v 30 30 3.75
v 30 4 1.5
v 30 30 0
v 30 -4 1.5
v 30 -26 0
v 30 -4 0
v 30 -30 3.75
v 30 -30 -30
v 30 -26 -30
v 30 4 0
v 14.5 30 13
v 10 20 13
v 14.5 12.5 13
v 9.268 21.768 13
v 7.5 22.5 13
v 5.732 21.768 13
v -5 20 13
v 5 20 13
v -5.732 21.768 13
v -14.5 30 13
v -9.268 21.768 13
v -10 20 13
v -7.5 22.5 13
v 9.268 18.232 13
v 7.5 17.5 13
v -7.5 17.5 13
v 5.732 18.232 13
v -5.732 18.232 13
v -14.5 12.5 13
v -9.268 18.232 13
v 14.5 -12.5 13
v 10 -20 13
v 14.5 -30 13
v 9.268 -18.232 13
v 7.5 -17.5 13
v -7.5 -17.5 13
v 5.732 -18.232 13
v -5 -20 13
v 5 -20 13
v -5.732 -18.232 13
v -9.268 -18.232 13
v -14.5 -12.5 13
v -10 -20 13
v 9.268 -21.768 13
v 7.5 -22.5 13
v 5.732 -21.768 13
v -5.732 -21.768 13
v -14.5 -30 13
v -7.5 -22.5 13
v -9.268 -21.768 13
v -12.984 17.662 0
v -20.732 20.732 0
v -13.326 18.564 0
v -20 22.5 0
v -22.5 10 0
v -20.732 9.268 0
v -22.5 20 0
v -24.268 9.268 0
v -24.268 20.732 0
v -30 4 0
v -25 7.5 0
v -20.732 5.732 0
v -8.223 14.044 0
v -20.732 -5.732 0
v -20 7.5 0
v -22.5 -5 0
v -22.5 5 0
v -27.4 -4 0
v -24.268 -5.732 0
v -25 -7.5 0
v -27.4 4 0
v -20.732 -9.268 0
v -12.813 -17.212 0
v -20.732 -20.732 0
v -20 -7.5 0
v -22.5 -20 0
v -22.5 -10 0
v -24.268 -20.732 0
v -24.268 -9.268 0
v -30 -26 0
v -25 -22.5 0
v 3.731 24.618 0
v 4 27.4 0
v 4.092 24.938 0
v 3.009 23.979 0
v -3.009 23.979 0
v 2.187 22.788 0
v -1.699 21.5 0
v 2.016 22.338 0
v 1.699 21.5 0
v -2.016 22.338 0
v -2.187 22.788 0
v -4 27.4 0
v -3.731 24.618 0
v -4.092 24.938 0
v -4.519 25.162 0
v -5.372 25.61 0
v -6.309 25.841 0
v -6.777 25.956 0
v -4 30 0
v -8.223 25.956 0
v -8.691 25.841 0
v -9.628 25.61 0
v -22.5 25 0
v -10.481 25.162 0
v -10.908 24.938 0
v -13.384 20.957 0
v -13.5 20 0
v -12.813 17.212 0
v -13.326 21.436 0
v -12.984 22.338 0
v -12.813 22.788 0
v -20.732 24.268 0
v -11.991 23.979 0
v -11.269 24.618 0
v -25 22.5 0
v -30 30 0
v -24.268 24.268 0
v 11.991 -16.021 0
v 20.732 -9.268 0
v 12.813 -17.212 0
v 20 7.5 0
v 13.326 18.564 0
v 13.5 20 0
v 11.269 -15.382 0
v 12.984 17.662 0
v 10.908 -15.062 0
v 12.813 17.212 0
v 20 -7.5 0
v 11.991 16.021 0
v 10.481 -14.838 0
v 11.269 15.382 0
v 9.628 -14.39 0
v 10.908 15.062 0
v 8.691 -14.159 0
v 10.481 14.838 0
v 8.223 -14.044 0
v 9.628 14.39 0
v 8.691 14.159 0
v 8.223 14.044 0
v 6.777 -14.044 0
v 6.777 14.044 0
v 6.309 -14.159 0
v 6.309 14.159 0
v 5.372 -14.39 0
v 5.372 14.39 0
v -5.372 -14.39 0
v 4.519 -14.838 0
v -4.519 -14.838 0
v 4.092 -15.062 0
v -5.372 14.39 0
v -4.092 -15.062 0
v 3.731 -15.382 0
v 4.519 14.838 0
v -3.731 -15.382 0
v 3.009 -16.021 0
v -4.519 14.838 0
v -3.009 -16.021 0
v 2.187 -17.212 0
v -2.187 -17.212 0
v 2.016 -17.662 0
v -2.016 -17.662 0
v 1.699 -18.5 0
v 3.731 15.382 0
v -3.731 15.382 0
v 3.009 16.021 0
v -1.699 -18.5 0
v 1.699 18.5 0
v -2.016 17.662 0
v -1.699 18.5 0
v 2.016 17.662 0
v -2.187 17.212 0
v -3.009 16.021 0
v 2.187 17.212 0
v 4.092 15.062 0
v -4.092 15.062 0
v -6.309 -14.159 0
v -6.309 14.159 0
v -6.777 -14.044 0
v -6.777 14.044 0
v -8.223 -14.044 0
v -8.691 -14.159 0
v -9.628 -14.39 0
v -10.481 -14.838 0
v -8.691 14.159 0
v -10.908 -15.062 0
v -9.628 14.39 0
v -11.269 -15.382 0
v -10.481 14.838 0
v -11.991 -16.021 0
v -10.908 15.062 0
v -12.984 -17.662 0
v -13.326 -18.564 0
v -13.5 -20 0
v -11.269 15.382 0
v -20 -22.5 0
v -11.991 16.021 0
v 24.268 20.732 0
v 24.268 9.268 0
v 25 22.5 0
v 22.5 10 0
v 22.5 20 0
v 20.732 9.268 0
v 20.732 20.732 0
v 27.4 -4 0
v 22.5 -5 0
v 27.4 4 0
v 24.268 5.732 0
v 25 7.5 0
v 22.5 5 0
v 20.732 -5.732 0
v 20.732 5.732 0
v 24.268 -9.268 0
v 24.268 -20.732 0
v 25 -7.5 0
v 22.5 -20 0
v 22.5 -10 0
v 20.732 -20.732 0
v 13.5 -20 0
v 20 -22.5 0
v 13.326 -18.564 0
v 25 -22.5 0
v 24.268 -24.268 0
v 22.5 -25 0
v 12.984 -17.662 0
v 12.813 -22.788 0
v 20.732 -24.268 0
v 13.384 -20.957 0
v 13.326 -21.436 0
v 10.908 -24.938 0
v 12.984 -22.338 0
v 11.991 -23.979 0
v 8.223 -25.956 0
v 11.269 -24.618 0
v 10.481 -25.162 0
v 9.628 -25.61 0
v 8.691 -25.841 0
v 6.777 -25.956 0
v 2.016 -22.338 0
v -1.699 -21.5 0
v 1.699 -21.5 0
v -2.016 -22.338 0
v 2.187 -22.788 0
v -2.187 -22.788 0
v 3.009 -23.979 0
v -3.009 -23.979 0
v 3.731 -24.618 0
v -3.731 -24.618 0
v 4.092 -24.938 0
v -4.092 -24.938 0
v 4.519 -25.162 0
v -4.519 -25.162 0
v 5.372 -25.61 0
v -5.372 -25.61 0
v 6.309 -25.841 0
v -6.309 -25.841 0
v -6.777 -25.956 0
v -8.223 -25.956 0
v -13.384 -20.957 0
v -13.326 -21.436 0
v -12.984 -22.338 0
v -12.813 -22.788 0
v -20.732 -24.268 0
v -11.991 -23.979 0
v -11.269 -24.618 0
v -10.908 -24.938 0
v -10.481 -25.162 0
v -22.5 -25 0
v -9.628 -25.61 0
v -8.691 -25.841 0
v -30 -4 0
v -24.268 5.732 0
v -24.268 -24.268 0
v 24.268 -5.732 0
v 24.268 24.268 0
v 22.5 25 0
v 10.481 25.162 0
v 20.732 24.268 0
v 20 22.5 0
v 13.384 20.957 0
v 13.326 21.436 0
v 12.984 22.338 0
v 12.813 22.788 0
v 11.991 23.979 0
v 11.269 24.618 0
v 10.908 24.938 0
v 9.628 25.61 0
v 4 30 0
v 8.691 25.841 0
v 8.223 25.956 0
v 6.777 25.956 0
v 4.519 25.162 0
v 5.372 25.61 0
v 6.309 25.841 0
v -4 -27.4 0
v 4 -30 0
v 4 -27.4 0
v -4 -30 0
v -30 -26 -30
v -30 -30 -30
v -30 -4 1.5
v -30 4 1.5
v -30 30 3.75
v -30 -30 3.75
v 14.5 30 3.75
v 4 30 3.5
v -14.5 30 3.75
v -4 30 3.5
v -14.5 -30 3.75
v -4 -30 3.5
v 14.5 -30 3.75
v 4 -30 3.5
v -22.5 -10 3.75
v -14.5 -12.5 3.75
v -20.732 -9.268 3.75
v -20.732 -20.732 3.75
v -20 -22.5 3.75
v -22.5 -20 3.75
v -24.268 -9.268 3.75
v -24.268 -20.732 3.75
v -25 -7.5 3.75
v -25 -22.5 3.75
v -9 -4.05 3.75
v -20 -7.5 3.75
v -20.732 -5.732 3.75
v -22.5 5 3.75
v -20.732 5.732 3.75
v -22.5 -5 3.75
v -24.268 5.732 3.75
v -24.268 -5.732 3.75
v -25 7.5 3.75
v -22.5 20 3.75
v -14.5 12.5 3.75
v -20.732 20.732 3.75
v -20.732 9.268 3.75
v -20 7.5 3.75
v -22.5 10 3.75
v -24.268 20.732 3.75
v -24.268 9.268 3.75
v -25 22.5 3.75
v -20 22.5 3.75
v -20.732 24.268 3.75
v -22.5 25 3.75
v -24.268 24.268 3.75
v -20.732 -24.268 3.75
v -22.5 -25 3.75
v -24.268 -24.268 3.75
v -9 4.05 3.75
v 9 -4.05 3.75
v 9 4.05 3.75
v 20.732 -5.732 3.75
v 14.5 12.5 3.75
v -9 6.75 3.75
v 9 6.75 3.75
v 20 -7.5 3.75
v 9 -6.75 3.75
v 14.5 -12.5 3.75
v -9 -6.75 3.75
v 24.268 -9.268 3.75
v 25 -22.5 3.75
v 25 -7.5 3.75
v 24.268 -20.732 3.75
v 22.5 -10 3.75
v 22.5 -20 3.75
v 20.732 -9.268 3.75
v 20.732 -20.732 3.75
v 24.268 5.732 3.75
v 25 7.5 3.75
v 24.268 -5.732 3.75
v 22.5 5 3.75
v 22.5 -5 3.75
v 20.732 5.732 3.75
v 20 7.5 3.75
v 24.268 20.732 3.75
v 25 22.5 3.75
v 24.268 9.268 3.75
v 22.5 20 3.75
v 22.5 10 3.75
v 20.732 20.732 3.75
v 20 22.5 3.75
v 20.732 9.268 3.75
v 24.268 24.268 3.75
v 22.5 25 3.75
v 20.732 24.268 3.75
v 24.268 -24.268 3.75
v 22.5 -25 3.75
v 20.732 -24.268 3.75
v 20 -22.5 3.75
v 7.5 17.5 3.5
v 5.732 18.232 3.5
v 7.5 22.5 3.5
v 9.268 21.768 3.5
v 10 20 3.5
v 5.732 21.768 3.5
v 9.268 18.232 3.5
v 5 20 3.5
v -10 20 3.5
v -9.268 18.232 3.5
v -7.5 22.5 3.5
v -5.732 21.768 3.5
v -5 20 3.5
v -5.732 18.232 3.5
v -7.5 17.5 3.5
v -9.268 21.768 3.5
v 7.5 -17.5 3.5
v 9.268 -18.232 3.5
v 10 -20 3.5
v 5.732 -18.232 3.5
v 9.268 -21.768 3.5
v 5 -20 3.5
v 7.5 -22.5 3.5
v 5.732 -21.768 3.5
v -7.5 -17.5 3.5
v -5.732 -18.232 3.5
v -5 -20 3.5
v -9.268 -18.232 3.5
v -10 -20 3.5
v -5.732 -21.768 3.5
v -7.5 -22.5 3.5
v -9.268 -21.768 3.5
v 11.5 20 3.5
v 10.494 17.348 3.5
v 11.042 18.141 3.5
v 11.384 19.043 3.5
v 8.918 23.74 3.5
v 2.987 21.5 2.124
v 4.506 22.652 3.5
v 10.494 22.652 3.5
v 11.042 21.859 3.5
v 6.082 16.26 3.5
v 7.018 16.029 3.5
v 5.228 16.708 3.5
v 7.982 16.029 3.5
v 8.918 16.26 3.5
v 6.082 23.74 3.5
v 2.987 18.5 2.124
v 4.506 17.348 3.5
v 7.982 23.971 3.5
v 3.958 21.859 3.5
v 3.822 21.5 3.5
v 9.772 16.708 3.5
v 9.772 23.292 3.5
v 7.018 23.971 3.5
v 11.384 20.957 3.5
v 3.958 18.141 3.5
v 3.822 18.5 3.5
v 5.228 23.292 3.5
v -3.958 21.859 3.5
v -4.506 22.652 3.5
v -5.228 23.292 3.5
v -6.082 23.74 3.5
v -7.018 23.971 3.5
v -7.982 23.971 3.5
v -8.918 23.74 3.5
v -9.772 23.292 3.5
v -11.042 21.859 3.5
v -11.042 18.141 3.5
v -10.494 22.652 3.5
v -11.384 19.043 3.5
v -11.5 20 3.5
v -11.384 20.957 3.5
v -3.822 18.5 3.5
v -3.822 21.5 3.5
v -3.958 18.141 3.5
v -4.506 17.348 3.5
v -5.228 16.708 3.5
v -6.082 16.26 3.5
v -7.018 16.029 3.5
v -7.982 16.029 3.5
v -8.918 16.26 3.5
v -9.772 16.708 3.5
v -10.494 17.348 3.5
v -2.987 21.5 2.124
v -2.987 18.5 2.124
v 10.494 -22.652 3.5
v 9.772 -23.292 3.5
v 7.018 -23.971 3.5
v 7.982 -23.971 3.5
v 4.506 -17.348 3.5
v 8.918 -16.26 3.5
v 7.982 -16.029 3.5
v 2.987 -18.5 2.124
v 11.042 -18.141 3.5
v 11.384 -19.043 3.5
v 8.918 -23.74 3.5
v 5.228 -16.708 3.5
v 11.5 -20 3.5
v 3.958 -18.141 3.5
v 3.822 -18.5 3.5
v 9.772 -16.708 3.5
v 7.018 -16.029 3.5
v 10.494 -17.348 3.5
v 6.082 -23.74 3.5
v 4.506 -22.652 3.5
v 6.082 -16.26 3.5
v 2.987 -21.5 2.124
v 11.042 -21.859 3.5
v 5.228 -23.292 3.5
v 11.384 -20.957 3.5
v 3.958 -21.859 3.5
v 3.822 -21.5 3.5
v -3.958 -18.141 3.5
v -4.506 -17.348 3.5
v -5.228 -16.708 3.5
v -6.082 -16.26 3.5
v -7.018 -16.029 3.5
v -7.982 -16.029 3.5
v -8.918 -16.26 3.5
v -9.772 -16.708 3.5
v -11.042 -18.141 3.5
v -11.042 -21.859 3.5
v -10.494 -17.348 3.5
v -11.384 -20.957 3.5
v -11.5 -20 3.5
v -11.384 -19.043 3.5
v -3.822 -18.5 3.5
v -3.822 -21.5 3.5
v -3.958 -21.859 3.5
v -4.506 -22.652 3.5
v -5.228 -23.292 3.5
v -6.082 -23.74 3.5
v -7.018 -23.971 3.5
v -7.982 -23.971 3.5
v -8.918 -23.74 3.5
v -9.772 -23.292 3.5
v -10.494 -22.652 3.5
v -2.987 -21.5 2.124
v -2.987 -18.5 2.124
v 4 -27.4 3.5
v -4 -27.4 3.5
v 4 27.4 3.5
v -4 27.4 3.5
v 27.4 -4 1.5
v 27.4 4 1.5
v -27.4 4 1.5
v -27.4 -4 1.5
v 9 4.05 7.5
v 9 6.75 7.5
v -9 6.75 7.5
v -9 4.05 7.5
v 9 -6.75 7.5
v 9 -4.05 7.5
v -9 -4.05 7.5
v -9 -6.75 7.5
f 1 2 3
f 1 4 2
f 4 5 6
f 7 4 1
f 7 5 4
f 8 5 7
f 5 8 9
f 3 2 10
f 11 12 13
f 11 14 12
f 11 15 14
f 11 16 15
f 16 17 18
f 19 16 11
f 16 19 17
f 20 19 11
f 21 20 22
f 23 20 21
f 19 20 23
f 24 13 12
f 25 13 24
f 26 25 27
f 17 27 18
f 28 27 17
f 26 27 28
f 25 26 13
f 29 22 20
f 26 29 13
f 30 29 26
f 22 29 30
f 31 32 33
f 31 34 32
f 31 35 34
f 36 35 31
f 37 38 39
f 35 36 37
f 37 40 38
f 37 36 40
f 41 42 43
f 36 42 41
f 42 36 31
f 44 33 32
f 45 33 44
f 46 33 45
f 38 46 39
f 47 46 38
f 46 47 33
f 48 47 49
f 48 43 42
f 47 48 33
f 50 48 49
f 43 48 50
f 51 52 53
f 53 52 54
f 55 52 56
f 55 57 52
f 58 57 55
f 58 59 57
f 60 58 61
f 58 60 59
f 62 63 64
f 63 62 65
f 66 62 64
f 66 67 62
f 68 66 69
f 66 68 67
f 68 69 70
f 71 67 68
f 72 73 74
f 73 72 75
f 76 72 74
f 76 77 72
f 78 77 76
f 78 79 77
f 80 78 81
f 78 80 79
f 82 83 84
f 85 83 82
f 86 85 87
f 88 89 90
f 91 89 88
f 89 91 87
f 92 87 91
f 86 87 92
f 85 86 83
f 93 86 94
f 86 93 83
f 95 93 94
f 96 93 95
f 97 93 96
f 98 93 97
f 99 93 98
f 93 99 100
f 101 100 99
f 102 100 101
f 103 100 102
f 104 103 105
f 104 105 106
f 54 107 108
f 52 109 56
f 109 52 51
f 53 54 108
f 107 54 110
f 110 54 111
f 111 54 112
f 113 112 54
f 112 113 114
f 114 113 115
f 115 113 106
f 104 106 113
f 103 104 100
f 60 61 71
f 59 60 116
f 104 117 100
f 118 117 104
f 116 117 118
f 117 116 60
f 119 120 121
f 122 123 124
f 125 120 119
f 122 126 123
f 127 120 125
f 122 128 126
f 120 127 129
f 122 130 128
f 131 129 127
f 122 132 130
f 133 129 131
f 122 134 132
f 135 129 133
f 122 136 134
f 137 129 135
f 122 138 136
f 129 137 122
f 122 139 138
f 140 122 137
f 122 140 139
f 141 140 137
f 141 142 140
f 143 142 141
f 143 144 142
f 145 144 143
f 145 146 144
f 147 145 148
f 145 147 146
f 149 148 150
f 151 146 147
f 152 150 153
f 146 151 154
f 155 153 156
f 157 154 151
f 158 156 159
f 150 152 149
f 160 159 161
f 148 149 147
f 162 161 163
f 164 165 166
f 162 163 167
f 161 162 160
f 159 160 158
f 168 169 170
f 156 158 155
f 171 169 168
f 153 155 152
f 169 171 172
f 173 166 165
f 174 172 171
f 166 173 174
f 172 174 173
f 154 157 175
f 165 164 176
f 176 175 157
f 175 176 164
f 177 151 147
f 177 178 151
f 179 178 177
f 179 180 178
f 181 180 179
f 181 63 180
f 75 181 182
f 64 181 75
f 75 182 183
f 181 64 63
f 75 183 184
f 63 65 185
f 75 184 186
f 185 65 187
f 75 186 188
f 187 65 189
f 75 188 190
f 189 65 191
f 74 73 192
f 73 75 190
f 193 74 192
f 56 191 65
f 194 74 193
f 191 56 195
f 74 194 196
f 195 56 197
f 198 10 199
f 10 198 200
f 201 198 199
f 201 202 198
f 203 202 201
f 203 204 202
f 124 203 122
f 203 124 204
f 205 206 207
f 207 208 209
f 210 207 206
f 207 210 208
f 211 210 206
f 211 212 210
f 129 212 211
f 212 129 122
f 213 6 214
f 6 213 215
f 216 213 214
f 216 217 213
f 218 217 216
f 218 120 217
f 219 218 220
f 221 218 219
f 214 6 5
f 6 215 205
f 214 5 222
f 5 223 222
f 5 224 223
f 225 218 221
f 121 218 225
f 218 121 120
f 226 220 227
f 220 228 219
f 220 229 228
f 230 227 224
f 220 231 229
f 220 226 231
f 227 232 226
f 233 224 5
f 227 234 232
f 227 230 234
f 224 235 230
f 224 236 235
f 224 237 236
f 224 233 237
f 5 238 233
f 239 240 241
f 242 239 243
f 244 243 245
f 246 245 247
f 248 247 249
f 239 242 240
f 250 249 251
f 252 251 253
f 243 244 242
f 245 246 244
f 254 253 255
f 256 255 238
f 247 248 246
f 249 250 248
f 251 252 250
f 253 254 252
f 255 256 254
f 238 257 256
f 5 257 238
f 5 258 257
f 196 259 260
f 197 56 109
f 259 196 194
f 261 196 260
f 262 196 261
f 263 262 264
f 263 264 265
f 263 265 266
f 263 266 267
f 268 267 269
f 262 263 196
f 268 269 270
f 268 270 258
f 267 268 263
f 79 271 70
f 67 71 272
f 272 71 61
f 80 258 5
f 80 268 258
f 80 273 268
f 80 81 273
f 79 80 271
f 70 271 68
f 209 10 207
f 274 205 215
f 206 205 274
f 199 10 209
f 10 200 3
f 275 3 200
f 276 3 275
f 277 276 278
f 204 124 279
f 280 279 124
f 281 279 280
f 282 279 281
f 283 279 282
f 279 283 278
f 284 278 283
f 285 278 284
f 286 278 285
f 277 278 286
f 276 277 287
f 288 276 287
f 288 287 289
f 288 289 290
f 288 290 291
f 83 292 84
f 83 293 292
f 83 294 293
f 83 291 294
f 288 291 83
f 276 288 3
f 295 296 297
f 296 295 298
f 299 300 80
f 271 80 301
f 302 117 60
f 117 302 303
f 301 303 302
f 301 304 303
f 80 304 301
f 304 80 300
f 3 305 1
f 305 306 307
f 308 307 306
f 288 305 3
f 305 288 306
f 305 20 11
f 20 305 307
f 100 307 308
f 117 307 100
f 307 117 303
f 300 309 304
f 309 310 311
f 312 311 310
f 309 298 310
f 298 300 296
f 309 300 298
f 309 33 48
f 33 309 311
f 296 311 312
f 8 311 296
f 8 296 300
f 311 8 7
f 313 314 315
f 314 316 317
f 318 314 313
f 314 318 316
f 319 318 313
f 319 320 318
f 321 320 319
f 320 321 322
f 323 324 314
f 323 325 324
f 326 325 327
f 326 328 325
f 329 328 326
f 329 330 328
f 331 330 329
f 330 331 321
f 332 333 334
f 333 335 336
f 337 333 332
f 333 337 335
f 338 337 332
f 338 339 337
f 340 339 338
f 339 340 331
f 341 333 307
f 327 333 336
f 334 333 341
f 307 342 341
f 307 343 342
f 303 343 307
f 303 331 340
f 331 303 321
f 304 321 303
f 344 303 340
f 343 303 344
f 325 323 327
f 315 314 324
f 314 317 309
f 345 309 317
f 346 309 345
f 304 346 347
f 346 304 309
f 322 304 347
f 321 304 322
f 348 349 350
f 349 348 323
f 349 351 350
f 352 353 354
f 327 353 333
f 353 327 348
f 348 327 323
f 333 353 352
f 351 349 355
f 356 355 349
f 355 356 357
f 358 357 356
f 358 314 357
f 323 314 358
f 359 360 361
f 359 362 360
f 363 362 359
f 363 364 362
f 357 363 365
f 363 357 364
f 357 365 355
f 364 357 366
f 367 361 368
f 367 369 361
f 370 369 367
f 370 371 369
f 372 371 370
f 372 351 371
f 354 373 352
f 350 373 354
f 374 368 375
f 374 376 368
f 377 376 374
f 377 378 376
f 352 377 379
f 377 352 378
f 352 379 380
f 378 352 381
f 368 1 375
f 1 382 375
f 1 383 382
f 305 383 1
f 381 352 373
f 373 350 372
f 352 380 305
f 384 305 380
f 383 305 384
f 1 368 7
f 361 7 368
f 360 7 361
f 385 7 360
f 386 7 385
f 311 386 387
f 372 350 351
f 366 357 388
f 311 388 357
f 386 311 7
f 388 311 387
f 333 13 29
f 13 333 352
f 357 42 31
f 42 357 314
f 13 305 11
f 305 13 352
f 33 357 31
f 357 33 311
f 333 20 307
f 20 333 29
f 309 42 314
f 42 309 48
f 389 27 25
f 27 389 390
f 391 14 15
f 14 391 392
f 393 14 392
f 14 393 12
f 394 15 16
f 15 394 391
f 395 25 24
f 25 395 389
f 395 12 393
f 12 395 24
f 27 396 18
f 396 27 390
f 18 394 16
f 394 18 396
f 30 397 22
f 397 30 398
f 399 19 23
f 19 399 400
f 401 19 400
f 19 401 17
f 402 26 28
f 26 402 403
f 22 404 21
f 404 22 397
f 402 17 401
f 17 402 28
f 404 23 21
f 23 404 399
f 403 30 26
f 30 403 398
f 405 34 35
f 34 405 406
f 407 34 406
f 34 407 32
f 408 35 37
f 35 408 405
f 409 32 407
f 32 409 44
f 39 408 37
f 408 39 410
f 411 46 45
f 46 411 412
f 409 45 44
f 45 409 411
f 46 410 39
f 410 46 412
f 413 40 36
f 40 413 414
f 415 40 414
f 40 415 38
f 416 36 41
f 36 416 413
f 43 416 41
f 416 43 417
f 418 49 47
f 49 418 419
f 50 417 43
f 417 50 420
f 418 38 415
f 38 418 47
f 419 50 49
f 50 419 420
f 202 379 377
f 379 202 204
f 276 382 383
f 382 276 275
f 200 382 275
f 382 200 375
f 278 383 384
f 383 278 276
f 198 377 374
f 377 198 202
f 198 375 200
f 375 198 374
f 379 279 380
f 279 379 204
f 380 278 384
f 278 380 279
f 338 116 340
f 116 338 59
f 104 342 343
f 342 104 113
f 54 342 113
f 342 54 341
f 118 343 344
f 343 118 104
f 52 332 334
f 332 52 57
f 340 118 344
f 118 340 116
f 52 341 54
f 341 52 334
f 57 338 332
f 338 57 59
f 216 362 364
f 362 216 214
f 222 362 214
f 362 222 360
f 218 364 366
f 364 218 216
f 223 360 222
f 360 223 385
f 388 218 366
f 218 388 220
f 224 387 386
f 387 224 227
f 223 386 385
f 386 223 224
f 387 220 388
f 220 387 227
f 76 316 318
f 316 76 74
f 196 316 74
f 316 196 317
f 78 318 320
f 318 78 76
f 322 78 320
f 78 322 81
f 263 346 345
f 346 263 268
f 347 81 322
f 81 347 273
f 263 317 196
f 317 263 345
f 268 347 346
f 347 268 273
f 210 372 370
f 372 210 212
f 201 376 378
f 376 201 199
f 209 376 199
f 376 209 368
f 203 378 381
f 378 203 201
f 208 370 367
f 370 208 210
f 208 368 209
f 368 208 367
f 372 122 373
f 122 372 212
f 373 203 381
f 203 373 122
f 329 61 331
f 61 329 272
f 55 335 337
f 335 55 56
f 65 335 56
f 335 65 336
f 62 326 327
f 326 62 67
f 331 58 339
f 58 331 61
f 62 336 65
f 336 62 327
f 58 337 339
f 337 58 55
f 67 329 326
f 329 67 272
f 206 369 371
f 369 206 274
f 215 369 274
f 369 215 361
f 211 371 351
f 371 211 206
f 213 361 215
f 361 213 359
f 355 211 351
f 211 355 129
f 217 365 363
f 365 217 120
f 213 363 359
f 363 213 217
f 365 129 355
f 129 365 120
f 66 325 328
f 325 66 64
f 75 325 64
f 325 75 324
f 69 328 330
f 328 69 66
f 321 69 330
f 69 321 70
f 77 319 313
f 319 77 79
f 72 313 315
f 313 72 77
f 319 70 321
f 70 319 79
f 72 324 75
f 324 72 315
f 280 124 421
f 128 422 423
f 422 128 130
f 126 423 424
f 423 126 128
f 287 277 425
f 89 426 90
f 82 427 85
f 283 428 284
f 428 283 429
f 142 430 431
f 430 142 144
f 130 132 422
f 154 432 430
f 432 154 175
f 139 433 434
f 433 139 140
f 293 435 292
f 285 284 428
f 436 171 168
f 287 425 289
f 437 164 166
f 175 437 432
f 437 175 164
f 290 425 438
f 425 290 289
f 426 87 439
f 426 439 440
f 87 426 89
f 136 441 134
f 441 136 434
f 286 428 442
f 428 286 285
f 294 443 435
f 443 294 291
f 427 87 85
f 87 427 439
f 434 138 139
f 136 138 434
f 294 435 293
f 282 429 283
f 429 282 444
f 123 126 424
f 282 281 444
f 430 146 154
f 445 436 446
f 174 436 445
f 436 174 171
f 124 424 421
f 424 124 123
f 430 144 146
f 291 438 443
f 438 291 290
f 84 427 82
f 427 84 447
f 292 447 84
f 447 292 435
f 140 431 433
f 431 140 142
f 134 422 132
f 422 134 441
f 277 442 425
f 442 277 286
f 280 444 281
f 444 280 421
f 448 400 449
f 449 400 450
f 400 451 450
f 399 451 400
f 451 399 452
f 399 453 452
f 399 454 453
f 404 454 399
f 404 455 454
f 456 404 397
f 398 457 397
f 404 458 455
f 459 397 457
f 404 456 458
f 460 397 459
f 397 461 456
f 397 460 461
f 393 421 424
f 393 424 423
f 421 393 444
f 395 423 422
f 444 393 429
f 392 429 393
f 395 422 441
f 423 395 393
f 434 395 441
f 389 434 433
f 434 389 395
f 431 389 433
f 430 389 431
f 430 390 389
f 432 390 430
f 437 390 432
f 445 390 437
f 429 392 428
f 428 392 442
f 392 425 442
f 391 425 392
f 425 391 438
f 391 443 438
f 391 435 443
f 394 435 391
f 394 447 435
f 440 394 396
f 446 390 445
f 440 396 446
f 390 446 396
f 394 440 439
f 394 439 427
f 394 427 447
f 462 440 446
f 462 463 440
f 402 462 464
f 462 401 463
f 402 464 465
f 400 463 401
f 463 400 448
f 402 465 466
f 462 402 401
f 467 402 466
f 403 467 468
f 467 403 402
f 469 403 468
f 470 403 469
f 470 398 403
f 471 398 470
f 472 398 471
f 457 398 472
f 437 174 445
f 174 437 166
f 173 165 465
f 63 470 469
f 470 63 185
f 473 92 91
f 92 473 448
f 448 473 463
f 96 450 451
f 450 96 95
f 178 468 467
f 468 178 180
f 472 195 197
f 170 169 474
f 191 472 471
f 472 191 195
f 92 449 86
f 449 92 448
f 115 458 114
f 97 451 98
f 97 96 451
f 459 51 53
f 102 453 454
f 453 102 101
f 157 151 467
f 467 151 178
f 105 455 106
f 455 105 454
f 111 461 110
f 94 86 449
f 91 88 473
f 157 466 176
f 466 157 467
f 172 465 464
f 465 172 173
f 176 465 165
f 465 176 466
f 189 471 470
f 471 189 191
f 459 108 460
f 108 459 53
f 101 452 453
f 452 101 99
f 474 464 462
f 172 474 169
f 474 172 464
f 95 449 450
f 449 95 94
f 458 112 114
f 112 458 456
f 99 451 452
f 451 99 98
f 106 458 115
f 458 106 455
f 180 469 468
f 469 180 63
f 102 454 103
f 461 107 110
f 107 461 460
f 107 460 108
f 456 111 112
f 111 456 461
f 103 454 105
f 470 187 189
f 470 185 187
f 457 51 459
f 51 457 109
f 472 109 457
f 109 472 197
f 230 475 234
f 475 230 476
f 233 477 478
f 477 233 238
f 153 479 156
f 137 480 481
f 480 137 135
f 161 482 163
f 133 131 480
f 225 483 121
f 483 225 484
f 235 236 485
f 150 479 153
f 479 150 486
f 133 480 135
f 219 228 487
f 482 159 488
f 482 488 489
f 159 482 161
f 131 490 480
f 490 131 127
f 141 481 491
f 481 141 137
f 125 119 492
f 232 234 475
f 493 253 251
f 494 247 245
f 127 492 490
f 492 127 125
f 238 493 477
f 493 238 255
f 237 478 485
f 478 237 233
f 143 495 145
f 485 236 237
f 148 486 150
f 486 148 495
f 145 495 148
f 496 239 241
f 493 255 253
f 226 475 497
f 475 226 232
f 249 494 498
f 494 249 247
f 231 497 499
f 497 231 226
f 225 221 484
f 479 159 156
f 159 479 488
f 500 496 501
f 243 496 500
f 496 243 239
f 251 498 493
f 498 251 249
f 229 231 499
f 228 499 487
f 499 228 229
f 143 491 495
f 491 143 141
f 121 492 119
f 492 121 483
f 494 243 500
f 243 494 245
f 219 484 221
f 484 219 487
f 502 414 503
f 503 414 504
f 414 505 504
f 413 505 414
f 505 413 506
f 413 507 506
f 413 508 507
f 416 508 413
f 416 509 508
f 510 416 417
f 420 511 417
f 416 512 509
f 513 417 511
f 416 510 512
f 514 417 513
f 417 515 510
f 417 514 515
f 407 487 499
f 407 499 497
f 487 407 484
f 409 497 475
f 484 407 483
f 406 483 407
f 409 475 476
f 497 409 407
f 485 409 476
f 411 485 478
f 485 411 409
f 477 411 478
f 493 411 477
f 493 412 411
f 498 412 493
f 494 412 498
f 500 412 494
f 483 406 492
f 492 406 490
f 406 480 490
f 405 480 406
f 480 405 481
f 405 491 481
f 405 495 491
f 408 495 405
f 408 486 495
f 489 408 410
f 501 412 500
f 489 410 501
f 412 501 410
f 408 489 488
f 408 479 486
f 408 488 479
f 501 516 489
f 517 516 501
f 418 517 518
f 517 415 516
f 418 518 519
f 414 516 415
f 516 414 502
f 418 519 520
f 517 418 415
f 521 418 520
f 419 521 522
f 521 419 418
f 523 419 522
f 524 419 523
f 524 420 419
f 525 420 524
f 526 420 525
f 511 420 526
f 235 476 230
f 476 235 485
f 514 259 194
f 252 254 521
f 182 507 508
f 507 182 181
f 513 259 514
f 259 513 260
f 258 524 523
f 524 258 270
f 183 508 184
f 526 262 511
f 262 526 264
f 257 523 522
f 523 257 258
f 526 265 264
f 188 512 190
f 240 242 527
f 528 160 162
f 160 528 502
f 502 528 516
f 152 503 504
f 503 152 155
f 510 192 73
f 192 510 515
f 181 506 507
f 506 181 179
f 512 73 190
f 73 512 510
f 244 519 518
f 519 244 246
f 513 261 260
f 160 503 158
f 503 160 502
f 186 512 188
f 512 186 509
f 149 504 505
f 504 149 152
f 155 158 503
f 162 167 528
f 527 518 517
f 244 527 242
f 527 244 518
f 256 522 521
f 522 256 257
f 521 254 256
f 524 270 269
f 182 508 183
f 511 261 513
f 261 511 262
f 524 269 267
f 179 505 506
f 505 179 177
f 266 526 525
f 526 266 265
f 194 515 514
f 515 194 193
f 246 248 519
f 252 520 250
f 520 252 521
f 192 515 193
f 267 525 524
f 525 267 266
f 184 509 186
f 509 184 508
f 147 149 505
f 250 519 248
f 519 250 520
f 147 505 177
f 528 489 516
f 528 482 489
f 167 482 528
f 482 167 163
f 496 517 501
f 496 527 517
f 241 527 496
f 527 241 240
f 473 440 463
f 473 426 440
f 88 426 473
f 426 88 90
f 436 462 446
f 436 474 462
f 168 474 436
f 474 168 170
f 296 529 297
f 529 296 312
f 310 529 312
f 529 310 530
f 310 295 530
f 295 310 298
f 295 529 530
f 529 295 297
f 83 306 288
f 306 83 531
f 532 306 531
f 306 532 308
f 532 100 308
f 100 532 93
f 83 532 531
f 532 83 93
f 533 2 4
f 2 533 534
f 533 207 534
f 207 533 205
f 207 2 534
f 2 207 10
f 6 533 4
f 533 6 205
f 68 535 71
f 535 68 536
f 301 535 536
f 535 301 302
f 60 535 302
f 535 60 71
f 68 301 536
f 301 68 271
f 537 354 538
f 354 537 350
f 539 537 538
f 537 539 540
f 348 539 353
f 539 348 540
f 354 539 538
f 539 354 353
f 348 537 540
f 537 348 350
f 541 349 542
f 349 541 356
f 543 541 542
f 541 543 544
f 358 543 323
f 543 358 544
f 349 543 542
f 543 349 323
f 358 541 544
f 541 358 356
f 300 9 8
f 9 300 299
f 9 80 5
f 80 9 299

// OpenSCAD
//block shape
x=60;
y=60;
z=13;

// track channel
f=x+10;
g=25;
h=9.5;
// block top
e=20;
r=y+10;
t=16.5;

// spacing of screw holes
cx=15;
cy=40;
dx=15;
dy=45;


difference()
{
    translate([0,0,z]/2) cube ([x,y,z],center=true);
    translate([0,0,z+4]/2) cube([f,g,h],center=true);
    translate([49,0,z+11]/2) cube ([e,r,t],center=true);
        translate([-49,0,z+11]/2) cube ([e,r,t],center=true);

  translate([cx,cy,0]/2) cylinder(d=5, h=50,  center=true);
  translate([-cx,cy,0]/2) cylinder(d=5, h=50,  center=true);
    translate([cx,-cy,0]/2) cylinder(d=5, h=50,  center=true);
    translate([-cx,-cy,0]/2) cylinder(d=5, h=50,  center=true);
  translate([dy,dy,0]/2) cylinder(d=5, h=50,  center=true);
  translate([-dy,dy,0]/2) cylinder(d=5, h=50,  center=true);
    translate([dy,-dy,0]/2) cylinder(d=5, h=50,  center=true);
    translate([-dy,-dy,0]/2) cylinder(d=5, h=50,  center=true);  
    translate([dy,dx,0]/2) cylinder(d=5, h=50,  center=true);
  translate([-dy,dx,0]/2) cylinder(d=5, h=50,  center=true);  
  translate([dy,-dx,0]/2) cylinder(d=5, h=50,  center=true);
  translate([-dy,-dx,0]/2) cylinder(d=5, h=50,  center=true);  
    
 translate([cx,cy,0]/2)  cylinder(d1=16, d2=8, h=7,  center=true);
 translate([-cx,cy,0]/2) cylinder(d1=16, d2=8, h=7, center=true);
    translate([cx,-cy,0]/2) cylinder(d1=16, d2=8, h=7,  center=true);
    translate([-cx,-cy,0]/2) cylinder(d1=16, d2=8, h=7,  center=true);    
// zip tie knotches    
    translate([0,-cy/2,11.5-10]) cube([18,3,4],center=true);
    translate([0,cy/2,11.5-10]) cube([18,3,4],center=true);
// removal knotches
       translate([0,-(6.8+51)/2,11.5-10]) cube([8,3,4],center=true);
   translate([0,(6.8+51)/2,11.5-10]) cube([8,3,4],center=true);
   translate([(6.8+51)/2,0,11.5-11]) cube([3,8,2],center=true);
   translate([-(6.8+51)/2,0,11.5-11]) cube([3,8,2],center=true);
}

translate([0,(6.8+4)/2,z-8]) cube([18,2.7,5],center=true);
translate([0,-(6.8+4)/2,z-8]) cube([18,2.7,5],center=true);

difference ()
{
    translate([0,-28,-15]) cube([60,4,30],center=true);
    
    
}

// difference ()
// {
//     translate([0,30,9]) cube([60,8,30],center=true);
//  }
